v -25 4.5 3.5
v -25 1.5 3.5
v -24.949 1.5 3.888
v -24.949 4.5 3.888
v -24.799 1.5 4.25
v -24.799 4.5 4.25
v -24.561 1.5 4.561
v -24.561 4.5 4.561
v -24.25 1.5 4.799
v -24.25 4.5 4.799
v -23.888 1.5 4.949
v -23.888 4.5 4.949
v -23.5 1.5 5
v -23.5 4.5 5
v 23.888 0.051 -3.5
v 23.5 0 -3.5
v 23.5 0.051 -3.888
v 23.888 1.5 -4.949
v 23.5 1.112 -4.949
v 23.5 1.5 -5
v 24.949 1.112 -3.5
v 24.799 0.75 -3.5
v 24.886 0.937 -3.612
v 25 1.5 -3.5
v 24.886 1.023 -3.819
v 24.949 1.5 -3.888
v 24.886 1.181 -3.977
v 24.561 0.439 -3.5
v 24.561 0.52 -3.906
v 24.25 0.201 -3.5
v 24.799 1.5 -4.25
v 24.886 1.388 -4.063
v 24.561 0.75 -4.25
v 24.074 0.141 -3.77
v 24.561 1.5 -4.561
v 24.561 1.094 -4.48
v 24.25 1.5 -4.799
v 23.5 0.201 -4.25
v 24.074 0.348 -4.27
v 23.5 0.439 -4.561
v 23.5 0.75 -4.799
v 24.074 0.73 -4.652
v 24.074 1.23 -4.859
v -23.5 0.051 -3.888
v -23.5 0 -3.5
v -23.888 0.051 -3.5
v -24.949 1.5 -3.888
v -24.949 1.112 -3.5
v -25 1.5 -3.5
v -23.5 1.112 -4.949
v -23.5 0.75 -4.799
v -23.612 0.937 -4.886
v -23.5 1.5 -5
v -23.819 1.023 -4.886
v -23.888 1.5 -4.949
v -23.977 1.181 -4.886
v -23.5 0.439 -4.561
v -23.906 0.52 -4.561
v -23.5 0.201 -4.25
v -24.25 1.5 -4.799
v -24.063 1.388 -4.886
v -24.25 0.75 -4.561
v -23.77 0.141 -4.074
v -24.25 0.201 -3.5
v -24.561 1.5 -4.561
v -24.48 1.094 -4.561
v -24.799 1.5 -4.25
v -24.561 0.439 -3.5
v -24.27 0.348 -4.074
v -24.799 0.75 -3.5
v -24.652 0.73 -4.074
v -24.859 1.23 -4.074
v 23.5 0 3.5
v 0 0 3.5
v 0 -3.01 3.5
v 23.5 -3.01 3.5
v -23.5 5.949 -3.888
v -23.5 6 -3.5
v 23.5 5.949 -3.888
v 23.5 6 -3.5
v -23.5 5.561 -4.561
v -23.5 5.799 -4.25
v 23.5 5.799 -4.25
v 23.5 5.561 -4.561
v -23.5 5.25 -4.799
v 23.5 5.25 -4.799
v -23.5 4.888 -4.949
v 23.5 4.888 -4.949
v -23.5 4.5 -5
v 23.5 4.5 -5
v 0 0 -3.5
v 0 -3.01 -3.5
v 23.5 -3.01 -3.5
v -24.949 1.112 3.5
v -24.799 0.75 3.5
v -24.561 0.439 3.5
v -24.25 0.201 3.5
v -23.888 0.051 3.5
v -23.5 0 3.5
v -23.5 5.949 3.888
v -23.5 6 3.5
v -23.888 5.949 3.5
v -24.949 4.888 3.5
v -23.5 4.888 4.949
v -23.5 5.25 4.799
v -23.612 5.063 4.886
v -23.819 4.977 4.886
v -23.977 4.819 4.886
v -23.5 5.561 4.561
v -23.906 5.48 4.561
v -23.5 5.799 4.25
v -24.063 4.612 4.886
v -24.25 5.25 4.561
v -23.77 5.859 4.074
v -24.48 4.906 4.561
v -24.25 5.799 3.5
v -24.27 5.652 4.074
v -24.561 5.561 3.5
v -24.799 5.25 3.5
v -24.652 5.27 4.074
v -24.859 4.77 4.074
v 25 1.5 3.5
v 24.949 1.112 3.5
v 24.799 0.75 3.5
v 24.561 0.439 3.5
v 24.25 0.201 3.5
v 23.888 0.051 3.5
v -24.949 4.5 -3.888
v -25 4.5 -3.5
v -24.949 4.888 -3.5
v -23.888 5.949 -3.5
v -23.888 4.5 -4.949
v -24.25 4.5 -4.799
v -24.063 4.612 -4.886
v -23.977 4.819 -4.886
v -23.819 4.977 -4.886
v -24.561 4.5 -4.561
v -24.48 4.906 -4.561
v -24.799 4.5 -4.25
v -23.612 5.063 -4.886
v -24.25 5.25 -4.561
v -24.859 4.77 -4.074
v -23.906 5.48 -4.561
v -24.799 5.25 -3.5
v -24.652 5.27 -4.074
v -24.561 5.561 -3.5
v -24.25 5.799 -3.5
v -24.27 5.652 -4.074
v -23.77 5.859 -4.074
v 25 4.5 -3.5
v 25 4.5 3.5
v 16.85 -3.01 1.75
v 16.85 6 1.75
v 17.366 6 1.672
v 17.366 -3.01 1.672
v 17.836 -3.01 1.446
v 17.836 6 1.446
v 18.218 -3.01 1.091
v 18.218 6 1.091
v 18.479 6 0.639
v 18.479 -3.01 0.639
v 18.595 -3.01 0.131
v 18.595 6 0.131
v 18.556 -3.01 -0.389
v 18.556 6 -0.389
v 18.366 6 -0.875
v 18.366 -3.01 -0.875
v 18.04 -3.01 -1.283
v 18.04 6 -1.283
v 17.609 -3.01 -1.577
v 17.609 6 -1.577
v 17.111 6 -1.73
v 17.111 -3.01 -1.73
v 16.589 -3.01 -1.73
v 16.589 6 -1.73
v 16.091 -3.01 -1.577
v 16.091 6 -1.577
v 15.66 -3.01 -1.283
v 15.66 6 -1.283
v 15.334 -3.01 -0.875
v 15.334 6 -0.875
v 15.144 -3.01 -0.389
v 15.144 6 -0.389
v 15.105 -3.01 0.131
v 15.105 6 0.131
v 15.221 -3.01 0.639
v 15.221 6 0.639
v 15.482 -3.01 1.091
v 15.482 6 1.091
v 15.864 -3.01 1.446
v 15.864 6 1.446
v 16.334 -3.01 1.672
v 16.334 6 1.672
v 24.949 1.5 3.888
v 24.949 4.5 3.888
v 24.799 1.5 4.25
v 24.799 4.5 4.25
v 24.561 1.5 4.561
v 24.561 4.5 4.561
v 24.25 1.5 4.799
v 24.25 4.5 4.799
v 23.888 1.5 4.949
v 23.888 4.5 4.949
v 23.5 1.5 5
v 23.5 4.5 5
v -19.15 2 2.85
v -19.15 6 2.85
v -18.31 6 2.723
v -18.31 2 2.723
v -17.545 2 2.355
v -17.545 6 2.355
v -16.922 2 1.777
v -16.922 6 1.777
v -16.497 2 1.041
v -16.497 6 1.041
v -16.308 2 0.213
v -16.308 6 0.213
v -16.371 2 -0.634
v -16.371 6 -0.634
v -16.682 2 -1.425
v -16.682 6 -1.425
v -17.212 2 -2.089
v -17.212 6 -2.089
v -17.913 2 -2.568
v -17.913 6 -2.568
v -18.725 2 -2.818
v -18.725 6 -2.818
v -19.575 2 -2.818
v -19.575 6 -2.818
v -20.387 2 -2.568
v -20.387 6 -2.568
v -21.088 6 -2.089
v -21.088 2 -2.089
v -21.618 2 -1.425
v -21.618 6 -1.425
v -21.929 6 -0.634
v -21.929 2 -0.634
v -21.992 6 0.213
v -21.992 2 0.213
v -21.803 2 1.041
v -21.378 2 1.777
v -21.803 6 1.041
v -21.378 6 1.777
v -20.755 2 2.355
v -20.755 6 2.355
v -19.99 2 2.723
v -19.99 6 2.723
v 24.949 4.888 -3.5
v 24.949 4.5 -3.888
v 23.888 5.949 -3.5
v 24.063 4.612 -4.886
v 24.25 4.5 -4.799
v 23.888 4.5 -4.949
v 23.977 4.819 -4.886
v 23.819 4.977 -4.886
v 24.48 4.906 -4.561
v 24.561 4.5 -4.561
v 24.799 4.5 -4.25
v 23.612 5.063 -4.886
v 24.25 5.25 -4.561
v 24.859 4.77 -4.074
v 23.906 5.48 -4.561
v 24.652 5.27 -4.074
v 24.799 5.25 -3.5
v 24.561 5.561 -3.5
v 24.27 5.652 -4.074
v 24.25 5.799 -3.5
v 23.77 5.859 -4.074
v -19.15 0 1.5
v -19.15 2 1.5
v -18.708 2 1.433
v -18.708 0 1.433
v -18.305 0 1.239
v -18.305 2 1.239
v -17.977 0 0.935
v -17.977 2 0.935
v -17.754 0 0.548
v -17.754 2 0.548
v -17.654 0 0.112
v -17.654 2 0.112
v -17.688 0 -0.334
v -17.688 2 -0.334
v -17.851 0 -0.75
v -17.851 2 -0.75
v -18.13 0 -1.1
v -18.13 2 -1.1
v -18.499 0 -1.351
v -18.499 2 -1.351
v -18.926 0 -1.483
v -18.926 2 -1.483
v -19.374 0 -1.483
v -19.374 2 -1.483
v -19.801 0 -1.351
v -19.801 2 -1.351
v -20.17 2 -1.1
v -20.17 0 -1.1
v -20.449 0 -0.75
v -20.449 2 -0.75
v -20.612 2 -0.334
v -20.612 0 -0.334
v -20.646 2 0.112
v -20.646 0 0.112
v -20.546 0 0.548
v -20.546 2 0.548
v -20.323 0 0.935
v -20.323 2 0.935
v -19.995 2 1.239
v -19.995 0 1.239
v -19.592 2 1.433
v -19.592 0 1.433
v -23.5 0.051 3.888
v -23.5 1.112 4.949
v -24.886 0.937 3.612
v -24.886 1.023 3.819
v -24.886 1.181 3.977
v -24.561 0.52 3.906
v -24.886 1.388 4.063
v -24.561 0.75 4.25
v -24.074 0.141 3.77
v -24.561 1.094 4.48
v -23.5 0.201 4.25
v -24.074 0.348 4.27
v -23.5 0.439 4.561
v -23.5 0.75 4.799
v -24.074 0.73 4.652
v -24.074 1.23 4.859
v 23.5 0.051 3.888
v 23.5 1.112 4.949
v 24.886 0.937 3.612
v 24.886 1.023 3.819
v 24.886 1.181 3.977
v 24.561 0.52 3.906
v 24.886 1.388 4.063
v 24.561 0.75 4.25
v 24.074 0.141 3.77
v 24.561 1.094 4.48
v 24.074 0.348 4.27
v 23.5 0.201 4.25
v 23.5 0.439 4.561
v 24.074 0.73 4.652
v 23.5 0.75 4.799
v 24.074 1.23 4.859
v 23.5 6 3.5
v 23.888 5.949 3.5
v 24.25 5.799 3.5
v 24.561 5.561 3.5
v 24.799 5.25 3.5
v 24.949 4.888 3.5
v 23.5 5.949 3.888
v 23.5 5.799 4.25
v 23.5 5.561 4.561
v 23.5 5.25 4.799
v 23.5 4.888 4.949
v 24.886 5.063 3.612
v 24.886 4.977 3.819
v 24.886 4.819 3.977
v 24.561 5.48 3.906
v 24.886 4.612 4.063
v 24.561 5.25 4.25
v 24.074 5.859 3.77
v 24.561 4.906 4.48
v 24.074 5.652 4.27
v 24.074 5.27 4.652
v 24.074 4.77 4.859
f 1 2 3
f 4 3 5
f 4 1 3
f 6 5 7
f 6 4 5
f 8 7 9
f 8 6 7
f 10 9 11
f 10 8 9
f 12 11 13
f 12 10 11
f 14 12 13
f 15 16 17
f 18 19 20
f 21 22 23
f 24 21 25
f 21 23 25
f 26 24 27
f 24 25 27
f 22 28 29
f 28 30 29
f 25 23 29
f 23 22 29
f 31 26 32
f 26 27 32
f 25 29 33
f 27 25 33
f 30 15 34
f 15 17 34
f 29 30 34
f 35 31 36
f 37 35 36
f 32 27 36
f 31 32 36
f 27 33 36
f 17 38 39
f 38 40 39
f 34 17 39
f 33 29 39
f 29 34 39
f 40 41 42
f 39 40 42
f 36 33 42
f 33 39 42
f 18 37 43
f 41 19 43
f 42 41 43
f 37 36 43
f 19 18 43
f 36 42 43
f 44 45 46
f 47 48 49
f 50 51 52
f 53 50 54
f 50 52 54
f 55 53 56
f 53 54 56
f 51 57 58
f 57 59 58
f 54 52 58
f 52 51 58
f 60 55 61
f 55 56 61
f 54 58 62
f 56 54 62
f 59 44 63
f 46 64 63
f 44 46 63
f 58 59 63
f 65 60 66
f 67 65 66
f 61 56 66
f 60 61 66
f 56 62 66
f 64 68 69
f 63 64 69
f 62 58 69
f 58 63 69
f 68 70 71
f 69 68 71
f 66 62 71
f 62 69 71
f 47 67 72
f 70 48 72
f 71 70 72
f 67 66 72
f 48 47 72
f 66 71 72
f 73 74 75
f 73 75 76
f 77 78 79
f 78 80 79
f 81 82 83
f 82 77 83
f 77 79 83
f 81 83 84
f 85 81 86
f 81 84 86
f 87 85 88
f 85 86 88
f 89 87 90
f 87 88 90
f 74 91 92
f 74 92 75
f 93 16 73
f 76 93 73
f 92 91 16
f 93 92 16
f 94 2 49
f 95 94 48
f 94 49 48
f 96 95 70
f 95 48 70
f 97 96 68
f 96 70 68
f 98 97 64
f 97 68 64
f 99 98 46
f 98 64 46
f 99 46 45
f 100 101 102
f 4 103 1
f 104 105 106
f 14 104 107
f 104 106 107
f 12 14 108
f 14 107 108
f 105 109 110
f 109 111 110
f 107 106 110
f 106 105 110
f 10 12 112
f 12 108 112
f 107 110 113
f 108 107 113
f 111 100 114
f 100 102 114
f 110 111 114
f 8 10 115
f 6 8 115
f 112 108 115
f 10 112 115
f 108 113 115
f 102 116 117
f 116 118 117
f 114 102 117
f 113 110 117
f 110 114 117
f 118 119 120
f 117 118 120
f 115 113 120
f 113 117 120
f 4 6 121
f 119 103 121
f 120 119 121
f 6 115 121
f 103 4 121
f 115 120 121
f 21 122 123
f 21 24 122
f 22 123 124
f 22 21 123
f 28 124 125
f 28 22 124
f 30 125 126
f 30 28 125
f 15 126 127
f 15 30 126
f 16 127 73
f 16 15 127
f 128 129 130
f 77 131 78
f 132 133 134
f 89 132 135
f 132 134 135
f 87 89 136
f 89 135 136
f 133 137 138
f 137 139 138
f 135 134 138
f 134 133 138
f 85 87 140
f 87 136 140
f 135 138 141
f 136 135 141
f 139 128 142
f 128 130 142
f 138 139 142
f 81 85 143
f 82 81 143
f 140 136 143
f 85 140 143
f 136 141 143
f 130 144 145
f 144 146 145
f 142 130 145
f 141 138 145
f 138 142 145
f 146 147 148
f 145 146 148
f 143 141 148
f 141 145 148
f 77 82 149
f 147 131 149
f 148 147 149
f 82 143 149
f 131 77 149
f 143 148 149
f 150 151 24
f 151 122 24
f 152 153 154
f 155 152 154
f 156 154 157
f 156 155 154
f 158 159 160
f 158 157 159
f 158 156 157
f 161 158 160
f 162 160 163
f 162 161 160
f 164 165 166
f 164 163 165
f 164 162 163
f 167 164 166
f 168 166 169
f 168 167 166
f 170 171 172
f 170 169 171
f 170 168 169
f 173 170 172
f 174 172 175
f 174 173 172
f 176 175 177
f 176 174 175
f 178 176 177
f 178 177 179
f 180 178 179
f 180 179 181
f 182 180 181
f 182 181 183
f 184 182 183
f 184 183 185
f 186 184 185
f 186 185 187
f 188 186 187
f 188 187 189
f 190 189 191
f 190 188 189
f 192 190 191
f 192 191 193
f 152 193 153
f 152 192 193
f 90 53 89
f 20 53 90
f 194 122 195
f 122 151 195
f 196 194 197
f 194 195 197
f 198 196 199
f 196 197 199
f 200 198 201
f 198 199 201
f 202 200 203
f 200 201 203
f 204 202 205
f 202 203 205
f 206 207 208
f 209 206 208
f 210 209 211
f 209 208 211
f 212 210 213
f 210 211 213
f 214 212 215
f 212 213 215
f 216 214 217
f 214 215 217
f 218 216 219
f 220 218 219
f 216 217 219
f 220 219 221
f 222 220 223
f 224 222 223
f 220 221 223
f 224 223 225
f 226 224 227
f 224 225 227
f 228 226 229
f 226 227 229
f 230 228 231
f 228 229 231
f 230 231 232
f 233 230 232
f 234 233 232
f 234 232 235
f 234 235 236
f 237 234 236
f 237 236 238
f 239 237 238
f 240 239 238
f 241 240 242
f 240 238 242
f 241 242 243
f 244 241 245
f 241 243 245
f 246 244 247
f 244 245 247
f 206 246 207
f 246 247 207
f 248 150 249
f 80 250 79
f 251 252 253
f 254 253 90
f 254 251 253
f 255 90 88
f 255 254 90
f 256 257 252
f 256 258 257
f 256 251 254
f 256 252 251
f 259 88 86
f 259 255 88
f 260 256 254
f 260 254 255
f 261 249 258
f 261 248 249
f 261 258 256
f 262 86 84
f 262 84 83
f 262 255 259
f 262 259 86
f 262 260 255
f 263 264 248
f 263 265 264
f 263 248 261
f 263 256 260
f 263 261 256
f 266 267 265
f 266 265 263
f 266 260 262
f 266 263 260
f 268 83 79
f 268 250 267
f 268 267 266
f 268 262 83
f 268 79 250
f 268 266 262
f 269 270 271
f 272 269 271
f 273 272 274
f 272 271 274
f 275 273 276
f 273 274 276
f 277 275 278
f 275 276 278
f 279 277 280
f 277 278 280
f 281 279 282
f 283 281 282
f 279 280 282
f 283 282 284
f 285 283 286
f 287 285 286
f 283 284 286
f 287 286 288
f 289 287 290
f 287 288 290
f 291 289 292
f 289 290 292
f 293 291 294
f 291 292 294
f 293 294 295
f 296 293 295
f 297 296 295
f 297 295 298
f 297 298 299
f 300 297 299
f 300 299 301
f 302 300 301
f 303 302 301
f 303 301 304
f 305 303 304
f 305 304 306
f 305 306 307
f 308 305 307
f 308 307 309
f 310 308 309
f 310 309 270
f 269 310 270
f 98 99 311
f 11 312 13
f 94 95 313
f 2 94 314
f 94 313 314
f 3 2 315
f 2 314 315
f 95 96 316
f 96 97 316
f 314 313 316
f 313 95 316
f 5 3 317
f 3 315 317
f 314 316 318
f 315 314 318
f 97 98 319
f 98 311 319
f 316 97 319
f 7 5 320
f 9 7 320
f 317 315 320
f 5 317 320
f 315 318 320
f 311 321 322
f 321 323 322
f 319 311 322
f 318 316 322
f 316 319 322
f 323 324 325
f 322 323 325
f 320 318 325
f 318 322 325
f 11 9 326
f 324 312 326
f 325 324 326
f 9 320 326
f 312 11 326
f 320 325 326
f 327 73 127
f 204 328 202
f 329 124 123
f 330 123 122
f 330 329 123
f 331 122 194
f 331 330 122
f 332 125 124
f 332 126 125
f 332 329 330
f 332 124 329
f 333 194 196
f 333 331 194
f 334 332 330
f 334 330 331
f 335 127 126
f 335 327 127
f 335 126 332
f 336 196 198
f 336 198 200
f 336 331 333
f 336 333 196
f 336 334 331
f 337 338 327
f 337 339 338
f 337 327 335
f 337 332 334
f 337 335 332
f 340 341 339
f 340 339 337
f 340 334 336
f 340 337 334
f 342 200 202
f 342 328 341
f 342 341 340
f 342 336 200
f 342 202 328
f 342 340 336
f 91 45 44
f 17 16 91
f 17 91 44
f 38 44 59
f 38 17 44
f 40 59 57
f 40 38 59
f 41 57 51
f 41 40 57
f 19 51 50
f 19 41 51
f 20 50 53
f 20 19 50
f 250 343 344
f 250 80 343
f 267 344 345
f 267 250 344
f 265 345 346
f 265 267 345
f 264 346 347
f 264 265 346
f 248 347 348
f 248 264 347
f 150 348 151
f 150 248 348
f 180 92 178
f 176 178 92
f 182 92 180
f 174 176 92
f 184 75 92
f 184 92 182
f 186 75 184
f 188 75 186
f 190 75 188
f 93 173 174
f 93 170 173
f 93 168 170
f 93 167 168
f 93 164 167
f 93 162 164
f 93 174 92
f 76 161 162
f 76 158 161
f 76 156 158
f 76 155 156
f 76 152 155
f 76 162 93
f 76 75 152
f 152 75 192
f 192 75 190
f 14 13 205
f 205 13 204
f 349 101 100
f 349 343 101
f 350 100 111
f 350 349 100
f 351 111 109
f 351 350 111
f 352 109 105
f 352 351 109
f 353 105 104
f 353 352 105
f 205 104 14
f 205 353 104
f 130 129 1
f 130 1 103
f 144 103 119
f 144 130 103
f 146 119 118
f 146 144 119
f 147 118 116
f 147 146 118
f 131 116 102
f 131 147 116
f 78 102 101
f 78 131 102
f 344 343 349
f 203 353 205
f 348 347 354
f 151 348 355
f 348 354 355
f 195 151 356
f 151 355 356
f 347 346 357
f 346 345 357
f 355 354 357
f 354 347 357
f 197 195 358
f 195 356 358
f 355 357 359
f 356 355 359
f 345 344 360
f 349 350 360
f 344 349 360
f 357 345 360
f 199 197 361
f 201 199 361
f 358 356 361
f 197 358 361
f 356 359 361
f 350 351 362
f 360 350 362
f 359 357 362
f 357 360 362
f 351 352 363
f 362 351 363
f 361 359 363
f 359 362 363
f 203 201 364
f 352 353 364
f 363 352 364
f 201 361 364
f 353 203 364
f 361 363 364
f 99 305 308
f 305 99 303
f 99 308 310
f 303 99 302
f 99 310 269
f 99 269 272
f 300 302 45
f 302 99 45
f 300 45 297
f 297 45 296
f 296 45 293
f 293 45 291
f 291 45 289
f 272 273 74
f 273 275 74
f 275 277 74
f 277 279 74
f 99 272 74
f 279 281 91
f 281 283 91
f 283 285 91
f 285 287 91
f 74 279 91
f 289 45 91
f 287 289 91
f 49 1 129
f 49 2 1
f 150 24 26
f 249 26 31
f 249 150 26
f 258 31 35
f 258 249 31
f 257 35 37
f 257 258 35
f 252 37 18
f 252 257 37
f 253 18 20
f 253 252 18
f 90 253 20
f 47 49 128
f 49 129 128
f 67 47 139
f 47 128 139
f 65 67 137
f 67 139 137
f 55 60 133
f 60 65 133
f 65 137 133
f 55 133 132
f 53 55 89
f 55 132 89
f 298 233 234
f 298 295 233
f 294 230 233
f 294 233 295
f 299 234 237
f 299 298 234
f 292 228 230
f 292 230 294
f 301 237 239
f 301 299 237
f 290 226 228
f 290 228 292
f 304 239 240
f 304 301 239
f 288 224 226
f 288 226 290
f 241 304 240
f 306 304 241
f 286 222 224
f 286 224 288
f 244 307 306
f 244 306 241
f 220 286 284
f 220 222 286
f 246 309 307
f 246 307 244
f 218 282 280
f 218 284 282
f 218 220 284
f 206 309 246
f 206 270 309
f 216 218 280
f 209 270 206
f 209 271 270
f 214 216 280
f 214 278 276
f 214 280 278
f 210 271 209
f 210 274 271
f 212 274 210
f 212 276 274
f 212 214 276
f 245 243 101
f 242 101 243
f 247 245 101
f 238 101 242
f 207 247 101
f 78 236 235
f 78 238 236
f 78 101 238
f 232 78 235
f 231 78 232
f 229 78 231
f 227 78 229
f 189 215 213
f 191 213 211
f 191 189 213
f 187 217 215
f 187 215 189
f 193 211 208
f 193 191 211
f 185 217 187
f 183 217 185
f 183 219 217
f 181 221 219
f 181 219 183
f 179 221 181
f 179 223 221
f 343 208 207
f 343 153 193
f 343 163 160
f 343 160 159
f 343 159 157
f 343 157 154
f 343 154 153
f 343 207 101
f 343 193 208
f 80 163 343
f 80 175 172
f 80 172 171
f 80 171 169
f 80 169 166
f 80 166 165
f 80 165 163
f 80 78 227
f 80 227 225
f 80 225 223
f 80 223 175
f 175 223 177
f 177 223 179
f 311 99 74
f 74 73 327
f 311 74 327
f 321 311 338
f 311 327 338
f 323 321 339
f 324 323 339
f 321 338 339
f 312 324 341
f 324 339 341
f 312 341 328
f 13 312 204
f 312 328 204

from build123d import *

# Parameters (mm, degrees)
SKETCH1_W               = 50
SKETCH1_H               = 10
BOSS_EXTRUDE1_DEPTH     = 6
SKETCH2_R               = 2.85
SKETCH2_R_2             = 1.5
CUT_EXTRUDE1_DEPTH      = 4
SKETCH3_R               = 1.5
CUT_EXTRUDE2_DEPTH      = 4
FILLET1_R               = 1.5
SKETCH6_W               = 23.5
SKETCH6_H               = 7
BOSS_EXTRUDE3_DEPTH     = 3.01
CUT_EXTRUDE4_DEPTH      = 27.191601707
CUT_EXTRUDE4_DEPTH_BACK = 27.191601707
SKETCH7_R               = 1.75
SKETCH8_R               = 1.5
CUT_EXTRUDE5_DEPTH      = 10


with BuildPart() as part:
    # Sketch1 → Boss-Extrude1 (new body)
    with BuildSketch(Plane(origin=(0, 0, 0), x_dir=(1, 0, 0), z_dir=(0, 1, 0))):
        Rectangle(SKETCH1_W, SKETCH1_H)
    extrude(amount=BOSS_EXTRUDE1_DEPTH)

    # Sketch2 → Cut-Extrude1 (cut)
    with BuildSketch(Plane(origin=(0, 6, 0), x_dir=(1, 0, 0), z_dir=(0, 1, 0))):
        with Locations(Location((-19.15, 0, 0), (0, 0, 270))):
            Circle(SKETCH2_R)
        with Locations(Location((16.85, 0, 0), (0, 0, 270))):
            Circle(SKETCH2_R_2)
    extrude(amount=-CUT_EXTRUDE1_DEPTH, mode=Mode.SUBTRACT)

    # Sketch3 → Cut-Extrude2 (cut)
    with BuildSketch(Plane(origin=(0, 2, 0), x_dir=(1, 0, 0), z_dir=(0, 1, 0))):
        with Locations(Location((16.85, 0, 0), (0, 0, 270))):
            Circle(SKETCH3_R)
    extrude(amount=-CUT_EXTRUDE2_DEPTH, mode=Mode.SUBTRACT)

    # Fillet1
    fillet1_edges = [part.edges().sort_by_distance(p)[0] for p in [
        (-25, 6, 0),
        (0, 6, 5),
        (25, 6, 0),
        (0, 0, 5),
        (-25, 0, 0),
        (0, 0, -5),
        (25, 0, 0),
        (25, 3, 5),
        (-25, 3, 5),
        (-25, 3, -5),
        (25, 3, -5),
        (0, 6, -5),
    ]]
    fillet(fillet1_edges, radius=FILLET1_R)

    # Sketch6 → Boss-Extrude3 (add)
    with BuildSketch(Plane.XZ):
        with Locations((11.75, 0)):
            Rectangle(SKETCH6_W, SKETCH6_H)
    extrude(amount=BOSS_EXTRUDE3_DEPTH)

    # Sketch7 → Cut-Extrude4 (cut, two sides: drawn at the far end of the back side and taken through both)
    with BuildSketch(Plane(origin=(0, 0, 0), x_dir=(1, 0, 0), z_dir=(0, 1, 0)).offset(-CUT_EXTRUDE4_DEPTH_BACK)):
        with Locations(Location((16.85, 0, 0), (0, 0, 270))):
            Circle(SKETCH7_R)
    extrude(amount=CUT_EXTRUDE4_DEPTH + CUT_EXTRUDE4_DEPTH_BACK, mode=Mode.SUBTRACT)

    # Sketch8 → Cut-Extrude5 (cut)
    with BuildSketch(Plane(origin=(0, 2, 0), x_dir=(1, 0, 0), z_dir=(0, 1, 0))):
        with Locations(Location((-19.15, 0, 0), (0, 0, 270))):
            Circle(SKETCH8_R)
    extrude(amount=-CUT_EXTRUDE5_DEPTH, mode=Mode.SUBTRACT)


solid = part.part
